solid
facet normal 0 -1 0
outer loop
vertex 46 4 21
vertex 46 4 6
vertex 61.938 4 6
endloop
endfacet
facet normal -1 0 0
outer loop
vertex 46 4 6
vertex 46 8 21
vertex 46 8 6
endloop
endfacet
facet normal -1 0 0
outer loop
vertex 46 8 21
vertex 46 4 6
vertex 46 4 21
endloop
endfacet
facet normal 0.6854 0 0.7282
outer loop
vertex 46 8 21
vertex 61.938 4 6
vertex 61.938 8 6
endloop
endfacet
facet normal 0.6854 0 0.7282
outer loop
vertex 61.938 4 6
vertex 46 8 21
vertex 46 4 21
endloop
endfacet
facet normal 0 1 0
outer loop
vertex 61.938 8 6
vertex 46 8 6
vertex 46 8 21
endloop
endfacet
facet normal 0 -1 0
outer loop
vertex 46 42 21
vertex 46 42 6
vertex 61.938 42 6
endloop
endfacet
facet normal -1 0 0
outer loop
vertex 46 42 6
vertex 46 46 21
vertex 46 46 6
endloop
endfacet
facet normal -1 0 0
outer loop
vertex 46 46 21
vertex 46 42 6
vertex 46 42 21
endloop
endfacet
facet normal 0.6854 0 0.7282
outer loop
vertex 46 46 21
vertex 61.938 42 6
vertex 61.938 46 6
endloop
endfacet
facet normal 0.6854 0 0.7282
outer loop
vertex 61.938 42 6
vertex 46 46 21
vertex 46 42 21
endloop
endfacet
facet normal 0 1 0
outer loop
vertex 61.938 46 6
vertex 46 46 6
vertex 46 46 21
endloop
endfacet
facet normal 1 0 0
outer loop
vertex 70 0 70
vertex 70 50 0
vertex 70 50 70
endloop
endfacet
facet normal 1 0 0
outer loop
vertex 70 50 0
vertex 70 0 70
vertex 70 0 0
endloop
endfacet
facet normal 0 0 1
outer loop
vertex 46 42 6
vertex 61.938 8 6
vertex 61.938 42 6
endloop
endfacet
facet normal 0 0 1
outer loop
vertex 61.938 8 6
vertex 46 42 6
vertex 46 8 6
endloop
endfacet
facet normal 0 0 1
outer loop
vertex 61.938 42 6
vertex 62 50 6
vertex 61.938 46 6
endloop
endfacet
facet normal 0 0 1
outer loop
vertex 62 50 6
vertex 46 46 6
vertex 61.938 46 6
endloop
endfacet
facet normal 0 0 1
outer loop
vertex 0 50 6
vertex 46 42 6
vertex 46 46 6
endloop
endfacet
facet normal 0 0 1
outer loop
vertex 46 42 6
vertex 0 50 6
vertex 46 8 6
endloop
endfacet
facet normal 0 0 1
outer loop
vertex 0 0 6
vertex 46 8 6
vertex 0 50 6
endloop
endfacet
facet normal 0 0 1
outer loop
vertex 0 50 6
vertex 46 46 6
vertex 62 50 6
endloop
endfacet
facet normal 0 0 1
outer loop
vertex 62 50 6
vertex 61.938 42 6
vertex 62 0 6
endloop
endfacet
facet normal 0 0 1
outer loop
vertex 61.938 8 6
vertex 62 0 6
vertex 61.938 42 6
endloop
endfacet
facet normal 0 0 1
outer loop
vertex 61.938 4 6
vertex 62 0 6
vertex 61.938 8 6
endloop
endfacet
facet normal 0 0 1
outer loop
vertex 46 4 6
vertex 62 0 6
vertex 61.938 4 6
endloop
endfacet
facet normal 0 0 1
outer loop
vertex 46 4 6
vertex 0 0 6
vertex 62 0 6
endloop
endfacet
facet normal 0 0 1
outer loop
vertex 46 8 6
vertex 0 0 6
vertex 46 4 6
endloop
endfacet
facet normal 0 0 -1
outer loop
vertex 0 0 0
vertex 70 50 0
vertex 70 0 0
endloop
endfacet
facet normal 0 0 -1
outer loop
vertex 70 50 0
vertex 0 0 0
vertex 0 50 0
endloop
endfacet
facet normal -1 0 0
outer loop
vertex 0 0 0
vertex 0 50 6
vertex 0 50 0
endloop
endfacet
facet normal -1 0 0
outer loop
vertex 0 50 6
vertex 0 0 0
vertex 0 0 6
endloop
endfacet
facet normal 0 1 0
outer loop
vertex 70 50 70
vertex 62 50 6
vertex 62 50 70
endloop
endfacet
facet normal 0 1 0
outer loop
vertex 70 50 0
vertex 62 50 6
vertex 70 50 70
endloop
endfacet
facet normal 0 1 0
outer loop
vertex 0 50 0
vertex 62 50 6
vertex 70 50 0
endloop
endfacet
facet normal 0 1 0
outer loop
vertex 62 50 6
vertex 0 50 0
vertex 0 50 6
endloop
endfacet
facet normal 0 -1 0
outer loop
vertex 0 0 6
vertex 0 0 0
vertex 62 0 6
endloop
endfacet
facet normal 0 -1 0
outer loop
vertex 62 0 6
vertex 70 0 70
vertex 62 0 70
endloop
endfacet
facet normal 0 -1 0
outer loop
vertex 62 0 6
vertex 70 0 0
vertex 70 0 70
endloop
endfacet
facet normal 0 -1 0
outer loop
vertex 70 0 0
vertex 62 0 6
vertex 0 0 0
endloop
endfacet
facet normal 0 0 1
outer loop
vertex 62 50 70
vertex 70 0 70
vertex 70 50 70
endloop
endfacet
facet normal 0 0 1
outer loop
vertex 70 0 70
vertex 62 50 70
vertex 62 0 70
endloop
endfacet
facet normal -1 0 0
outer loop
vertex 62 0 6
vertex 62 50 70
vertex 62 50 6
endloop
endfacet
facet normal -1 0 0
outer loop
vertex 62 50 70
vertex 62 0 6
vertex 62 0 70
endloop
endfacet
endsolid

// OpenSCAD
$fn = 32;

// ----------------------------------------------------------------------
// Rib bracket: 2-gusset L bracket
// ----------------------------------------------------------------------

// --- parameters (mm) ---
base_l = 70;              // foot length, X
base_w = 50;              // foot width, Y
base_t = 6;               // foot thickness
plate_t = 8;              // upright plate thickness
plate_h = 70;             // overall height
gus_l = 16;               // gusset leg along the foot
gus_h = 16;               // gusset height
gus_t = 4;                // gusset thickness
gus_edge = 4;             // gusset margin from the foot edge
n_gus = 2;                // gusset count

gus_pitch = (base_w - 2 * gus_edge - gus_t) / (n_gus - 1);  // gusset pitch

union() {
  cube([base_l, base_w, base_t]);
  translate([base_l - plate_t, 0, base_t - 1])
    cube([plate_t, base_w, plate_h - base_t + 1]);
  for (i = [0 : n_gus - 1])
    translate([base_l - plate_t - gus_l, gus_edge + i * gus_pitch, base_t - 1])
      rotate([-90, 0, 0])
        linear_extrude(height = gus_t)
          polygon(points = [[0, 0], [gus_l + 1, 0], [0, -gus_h]]);
}
